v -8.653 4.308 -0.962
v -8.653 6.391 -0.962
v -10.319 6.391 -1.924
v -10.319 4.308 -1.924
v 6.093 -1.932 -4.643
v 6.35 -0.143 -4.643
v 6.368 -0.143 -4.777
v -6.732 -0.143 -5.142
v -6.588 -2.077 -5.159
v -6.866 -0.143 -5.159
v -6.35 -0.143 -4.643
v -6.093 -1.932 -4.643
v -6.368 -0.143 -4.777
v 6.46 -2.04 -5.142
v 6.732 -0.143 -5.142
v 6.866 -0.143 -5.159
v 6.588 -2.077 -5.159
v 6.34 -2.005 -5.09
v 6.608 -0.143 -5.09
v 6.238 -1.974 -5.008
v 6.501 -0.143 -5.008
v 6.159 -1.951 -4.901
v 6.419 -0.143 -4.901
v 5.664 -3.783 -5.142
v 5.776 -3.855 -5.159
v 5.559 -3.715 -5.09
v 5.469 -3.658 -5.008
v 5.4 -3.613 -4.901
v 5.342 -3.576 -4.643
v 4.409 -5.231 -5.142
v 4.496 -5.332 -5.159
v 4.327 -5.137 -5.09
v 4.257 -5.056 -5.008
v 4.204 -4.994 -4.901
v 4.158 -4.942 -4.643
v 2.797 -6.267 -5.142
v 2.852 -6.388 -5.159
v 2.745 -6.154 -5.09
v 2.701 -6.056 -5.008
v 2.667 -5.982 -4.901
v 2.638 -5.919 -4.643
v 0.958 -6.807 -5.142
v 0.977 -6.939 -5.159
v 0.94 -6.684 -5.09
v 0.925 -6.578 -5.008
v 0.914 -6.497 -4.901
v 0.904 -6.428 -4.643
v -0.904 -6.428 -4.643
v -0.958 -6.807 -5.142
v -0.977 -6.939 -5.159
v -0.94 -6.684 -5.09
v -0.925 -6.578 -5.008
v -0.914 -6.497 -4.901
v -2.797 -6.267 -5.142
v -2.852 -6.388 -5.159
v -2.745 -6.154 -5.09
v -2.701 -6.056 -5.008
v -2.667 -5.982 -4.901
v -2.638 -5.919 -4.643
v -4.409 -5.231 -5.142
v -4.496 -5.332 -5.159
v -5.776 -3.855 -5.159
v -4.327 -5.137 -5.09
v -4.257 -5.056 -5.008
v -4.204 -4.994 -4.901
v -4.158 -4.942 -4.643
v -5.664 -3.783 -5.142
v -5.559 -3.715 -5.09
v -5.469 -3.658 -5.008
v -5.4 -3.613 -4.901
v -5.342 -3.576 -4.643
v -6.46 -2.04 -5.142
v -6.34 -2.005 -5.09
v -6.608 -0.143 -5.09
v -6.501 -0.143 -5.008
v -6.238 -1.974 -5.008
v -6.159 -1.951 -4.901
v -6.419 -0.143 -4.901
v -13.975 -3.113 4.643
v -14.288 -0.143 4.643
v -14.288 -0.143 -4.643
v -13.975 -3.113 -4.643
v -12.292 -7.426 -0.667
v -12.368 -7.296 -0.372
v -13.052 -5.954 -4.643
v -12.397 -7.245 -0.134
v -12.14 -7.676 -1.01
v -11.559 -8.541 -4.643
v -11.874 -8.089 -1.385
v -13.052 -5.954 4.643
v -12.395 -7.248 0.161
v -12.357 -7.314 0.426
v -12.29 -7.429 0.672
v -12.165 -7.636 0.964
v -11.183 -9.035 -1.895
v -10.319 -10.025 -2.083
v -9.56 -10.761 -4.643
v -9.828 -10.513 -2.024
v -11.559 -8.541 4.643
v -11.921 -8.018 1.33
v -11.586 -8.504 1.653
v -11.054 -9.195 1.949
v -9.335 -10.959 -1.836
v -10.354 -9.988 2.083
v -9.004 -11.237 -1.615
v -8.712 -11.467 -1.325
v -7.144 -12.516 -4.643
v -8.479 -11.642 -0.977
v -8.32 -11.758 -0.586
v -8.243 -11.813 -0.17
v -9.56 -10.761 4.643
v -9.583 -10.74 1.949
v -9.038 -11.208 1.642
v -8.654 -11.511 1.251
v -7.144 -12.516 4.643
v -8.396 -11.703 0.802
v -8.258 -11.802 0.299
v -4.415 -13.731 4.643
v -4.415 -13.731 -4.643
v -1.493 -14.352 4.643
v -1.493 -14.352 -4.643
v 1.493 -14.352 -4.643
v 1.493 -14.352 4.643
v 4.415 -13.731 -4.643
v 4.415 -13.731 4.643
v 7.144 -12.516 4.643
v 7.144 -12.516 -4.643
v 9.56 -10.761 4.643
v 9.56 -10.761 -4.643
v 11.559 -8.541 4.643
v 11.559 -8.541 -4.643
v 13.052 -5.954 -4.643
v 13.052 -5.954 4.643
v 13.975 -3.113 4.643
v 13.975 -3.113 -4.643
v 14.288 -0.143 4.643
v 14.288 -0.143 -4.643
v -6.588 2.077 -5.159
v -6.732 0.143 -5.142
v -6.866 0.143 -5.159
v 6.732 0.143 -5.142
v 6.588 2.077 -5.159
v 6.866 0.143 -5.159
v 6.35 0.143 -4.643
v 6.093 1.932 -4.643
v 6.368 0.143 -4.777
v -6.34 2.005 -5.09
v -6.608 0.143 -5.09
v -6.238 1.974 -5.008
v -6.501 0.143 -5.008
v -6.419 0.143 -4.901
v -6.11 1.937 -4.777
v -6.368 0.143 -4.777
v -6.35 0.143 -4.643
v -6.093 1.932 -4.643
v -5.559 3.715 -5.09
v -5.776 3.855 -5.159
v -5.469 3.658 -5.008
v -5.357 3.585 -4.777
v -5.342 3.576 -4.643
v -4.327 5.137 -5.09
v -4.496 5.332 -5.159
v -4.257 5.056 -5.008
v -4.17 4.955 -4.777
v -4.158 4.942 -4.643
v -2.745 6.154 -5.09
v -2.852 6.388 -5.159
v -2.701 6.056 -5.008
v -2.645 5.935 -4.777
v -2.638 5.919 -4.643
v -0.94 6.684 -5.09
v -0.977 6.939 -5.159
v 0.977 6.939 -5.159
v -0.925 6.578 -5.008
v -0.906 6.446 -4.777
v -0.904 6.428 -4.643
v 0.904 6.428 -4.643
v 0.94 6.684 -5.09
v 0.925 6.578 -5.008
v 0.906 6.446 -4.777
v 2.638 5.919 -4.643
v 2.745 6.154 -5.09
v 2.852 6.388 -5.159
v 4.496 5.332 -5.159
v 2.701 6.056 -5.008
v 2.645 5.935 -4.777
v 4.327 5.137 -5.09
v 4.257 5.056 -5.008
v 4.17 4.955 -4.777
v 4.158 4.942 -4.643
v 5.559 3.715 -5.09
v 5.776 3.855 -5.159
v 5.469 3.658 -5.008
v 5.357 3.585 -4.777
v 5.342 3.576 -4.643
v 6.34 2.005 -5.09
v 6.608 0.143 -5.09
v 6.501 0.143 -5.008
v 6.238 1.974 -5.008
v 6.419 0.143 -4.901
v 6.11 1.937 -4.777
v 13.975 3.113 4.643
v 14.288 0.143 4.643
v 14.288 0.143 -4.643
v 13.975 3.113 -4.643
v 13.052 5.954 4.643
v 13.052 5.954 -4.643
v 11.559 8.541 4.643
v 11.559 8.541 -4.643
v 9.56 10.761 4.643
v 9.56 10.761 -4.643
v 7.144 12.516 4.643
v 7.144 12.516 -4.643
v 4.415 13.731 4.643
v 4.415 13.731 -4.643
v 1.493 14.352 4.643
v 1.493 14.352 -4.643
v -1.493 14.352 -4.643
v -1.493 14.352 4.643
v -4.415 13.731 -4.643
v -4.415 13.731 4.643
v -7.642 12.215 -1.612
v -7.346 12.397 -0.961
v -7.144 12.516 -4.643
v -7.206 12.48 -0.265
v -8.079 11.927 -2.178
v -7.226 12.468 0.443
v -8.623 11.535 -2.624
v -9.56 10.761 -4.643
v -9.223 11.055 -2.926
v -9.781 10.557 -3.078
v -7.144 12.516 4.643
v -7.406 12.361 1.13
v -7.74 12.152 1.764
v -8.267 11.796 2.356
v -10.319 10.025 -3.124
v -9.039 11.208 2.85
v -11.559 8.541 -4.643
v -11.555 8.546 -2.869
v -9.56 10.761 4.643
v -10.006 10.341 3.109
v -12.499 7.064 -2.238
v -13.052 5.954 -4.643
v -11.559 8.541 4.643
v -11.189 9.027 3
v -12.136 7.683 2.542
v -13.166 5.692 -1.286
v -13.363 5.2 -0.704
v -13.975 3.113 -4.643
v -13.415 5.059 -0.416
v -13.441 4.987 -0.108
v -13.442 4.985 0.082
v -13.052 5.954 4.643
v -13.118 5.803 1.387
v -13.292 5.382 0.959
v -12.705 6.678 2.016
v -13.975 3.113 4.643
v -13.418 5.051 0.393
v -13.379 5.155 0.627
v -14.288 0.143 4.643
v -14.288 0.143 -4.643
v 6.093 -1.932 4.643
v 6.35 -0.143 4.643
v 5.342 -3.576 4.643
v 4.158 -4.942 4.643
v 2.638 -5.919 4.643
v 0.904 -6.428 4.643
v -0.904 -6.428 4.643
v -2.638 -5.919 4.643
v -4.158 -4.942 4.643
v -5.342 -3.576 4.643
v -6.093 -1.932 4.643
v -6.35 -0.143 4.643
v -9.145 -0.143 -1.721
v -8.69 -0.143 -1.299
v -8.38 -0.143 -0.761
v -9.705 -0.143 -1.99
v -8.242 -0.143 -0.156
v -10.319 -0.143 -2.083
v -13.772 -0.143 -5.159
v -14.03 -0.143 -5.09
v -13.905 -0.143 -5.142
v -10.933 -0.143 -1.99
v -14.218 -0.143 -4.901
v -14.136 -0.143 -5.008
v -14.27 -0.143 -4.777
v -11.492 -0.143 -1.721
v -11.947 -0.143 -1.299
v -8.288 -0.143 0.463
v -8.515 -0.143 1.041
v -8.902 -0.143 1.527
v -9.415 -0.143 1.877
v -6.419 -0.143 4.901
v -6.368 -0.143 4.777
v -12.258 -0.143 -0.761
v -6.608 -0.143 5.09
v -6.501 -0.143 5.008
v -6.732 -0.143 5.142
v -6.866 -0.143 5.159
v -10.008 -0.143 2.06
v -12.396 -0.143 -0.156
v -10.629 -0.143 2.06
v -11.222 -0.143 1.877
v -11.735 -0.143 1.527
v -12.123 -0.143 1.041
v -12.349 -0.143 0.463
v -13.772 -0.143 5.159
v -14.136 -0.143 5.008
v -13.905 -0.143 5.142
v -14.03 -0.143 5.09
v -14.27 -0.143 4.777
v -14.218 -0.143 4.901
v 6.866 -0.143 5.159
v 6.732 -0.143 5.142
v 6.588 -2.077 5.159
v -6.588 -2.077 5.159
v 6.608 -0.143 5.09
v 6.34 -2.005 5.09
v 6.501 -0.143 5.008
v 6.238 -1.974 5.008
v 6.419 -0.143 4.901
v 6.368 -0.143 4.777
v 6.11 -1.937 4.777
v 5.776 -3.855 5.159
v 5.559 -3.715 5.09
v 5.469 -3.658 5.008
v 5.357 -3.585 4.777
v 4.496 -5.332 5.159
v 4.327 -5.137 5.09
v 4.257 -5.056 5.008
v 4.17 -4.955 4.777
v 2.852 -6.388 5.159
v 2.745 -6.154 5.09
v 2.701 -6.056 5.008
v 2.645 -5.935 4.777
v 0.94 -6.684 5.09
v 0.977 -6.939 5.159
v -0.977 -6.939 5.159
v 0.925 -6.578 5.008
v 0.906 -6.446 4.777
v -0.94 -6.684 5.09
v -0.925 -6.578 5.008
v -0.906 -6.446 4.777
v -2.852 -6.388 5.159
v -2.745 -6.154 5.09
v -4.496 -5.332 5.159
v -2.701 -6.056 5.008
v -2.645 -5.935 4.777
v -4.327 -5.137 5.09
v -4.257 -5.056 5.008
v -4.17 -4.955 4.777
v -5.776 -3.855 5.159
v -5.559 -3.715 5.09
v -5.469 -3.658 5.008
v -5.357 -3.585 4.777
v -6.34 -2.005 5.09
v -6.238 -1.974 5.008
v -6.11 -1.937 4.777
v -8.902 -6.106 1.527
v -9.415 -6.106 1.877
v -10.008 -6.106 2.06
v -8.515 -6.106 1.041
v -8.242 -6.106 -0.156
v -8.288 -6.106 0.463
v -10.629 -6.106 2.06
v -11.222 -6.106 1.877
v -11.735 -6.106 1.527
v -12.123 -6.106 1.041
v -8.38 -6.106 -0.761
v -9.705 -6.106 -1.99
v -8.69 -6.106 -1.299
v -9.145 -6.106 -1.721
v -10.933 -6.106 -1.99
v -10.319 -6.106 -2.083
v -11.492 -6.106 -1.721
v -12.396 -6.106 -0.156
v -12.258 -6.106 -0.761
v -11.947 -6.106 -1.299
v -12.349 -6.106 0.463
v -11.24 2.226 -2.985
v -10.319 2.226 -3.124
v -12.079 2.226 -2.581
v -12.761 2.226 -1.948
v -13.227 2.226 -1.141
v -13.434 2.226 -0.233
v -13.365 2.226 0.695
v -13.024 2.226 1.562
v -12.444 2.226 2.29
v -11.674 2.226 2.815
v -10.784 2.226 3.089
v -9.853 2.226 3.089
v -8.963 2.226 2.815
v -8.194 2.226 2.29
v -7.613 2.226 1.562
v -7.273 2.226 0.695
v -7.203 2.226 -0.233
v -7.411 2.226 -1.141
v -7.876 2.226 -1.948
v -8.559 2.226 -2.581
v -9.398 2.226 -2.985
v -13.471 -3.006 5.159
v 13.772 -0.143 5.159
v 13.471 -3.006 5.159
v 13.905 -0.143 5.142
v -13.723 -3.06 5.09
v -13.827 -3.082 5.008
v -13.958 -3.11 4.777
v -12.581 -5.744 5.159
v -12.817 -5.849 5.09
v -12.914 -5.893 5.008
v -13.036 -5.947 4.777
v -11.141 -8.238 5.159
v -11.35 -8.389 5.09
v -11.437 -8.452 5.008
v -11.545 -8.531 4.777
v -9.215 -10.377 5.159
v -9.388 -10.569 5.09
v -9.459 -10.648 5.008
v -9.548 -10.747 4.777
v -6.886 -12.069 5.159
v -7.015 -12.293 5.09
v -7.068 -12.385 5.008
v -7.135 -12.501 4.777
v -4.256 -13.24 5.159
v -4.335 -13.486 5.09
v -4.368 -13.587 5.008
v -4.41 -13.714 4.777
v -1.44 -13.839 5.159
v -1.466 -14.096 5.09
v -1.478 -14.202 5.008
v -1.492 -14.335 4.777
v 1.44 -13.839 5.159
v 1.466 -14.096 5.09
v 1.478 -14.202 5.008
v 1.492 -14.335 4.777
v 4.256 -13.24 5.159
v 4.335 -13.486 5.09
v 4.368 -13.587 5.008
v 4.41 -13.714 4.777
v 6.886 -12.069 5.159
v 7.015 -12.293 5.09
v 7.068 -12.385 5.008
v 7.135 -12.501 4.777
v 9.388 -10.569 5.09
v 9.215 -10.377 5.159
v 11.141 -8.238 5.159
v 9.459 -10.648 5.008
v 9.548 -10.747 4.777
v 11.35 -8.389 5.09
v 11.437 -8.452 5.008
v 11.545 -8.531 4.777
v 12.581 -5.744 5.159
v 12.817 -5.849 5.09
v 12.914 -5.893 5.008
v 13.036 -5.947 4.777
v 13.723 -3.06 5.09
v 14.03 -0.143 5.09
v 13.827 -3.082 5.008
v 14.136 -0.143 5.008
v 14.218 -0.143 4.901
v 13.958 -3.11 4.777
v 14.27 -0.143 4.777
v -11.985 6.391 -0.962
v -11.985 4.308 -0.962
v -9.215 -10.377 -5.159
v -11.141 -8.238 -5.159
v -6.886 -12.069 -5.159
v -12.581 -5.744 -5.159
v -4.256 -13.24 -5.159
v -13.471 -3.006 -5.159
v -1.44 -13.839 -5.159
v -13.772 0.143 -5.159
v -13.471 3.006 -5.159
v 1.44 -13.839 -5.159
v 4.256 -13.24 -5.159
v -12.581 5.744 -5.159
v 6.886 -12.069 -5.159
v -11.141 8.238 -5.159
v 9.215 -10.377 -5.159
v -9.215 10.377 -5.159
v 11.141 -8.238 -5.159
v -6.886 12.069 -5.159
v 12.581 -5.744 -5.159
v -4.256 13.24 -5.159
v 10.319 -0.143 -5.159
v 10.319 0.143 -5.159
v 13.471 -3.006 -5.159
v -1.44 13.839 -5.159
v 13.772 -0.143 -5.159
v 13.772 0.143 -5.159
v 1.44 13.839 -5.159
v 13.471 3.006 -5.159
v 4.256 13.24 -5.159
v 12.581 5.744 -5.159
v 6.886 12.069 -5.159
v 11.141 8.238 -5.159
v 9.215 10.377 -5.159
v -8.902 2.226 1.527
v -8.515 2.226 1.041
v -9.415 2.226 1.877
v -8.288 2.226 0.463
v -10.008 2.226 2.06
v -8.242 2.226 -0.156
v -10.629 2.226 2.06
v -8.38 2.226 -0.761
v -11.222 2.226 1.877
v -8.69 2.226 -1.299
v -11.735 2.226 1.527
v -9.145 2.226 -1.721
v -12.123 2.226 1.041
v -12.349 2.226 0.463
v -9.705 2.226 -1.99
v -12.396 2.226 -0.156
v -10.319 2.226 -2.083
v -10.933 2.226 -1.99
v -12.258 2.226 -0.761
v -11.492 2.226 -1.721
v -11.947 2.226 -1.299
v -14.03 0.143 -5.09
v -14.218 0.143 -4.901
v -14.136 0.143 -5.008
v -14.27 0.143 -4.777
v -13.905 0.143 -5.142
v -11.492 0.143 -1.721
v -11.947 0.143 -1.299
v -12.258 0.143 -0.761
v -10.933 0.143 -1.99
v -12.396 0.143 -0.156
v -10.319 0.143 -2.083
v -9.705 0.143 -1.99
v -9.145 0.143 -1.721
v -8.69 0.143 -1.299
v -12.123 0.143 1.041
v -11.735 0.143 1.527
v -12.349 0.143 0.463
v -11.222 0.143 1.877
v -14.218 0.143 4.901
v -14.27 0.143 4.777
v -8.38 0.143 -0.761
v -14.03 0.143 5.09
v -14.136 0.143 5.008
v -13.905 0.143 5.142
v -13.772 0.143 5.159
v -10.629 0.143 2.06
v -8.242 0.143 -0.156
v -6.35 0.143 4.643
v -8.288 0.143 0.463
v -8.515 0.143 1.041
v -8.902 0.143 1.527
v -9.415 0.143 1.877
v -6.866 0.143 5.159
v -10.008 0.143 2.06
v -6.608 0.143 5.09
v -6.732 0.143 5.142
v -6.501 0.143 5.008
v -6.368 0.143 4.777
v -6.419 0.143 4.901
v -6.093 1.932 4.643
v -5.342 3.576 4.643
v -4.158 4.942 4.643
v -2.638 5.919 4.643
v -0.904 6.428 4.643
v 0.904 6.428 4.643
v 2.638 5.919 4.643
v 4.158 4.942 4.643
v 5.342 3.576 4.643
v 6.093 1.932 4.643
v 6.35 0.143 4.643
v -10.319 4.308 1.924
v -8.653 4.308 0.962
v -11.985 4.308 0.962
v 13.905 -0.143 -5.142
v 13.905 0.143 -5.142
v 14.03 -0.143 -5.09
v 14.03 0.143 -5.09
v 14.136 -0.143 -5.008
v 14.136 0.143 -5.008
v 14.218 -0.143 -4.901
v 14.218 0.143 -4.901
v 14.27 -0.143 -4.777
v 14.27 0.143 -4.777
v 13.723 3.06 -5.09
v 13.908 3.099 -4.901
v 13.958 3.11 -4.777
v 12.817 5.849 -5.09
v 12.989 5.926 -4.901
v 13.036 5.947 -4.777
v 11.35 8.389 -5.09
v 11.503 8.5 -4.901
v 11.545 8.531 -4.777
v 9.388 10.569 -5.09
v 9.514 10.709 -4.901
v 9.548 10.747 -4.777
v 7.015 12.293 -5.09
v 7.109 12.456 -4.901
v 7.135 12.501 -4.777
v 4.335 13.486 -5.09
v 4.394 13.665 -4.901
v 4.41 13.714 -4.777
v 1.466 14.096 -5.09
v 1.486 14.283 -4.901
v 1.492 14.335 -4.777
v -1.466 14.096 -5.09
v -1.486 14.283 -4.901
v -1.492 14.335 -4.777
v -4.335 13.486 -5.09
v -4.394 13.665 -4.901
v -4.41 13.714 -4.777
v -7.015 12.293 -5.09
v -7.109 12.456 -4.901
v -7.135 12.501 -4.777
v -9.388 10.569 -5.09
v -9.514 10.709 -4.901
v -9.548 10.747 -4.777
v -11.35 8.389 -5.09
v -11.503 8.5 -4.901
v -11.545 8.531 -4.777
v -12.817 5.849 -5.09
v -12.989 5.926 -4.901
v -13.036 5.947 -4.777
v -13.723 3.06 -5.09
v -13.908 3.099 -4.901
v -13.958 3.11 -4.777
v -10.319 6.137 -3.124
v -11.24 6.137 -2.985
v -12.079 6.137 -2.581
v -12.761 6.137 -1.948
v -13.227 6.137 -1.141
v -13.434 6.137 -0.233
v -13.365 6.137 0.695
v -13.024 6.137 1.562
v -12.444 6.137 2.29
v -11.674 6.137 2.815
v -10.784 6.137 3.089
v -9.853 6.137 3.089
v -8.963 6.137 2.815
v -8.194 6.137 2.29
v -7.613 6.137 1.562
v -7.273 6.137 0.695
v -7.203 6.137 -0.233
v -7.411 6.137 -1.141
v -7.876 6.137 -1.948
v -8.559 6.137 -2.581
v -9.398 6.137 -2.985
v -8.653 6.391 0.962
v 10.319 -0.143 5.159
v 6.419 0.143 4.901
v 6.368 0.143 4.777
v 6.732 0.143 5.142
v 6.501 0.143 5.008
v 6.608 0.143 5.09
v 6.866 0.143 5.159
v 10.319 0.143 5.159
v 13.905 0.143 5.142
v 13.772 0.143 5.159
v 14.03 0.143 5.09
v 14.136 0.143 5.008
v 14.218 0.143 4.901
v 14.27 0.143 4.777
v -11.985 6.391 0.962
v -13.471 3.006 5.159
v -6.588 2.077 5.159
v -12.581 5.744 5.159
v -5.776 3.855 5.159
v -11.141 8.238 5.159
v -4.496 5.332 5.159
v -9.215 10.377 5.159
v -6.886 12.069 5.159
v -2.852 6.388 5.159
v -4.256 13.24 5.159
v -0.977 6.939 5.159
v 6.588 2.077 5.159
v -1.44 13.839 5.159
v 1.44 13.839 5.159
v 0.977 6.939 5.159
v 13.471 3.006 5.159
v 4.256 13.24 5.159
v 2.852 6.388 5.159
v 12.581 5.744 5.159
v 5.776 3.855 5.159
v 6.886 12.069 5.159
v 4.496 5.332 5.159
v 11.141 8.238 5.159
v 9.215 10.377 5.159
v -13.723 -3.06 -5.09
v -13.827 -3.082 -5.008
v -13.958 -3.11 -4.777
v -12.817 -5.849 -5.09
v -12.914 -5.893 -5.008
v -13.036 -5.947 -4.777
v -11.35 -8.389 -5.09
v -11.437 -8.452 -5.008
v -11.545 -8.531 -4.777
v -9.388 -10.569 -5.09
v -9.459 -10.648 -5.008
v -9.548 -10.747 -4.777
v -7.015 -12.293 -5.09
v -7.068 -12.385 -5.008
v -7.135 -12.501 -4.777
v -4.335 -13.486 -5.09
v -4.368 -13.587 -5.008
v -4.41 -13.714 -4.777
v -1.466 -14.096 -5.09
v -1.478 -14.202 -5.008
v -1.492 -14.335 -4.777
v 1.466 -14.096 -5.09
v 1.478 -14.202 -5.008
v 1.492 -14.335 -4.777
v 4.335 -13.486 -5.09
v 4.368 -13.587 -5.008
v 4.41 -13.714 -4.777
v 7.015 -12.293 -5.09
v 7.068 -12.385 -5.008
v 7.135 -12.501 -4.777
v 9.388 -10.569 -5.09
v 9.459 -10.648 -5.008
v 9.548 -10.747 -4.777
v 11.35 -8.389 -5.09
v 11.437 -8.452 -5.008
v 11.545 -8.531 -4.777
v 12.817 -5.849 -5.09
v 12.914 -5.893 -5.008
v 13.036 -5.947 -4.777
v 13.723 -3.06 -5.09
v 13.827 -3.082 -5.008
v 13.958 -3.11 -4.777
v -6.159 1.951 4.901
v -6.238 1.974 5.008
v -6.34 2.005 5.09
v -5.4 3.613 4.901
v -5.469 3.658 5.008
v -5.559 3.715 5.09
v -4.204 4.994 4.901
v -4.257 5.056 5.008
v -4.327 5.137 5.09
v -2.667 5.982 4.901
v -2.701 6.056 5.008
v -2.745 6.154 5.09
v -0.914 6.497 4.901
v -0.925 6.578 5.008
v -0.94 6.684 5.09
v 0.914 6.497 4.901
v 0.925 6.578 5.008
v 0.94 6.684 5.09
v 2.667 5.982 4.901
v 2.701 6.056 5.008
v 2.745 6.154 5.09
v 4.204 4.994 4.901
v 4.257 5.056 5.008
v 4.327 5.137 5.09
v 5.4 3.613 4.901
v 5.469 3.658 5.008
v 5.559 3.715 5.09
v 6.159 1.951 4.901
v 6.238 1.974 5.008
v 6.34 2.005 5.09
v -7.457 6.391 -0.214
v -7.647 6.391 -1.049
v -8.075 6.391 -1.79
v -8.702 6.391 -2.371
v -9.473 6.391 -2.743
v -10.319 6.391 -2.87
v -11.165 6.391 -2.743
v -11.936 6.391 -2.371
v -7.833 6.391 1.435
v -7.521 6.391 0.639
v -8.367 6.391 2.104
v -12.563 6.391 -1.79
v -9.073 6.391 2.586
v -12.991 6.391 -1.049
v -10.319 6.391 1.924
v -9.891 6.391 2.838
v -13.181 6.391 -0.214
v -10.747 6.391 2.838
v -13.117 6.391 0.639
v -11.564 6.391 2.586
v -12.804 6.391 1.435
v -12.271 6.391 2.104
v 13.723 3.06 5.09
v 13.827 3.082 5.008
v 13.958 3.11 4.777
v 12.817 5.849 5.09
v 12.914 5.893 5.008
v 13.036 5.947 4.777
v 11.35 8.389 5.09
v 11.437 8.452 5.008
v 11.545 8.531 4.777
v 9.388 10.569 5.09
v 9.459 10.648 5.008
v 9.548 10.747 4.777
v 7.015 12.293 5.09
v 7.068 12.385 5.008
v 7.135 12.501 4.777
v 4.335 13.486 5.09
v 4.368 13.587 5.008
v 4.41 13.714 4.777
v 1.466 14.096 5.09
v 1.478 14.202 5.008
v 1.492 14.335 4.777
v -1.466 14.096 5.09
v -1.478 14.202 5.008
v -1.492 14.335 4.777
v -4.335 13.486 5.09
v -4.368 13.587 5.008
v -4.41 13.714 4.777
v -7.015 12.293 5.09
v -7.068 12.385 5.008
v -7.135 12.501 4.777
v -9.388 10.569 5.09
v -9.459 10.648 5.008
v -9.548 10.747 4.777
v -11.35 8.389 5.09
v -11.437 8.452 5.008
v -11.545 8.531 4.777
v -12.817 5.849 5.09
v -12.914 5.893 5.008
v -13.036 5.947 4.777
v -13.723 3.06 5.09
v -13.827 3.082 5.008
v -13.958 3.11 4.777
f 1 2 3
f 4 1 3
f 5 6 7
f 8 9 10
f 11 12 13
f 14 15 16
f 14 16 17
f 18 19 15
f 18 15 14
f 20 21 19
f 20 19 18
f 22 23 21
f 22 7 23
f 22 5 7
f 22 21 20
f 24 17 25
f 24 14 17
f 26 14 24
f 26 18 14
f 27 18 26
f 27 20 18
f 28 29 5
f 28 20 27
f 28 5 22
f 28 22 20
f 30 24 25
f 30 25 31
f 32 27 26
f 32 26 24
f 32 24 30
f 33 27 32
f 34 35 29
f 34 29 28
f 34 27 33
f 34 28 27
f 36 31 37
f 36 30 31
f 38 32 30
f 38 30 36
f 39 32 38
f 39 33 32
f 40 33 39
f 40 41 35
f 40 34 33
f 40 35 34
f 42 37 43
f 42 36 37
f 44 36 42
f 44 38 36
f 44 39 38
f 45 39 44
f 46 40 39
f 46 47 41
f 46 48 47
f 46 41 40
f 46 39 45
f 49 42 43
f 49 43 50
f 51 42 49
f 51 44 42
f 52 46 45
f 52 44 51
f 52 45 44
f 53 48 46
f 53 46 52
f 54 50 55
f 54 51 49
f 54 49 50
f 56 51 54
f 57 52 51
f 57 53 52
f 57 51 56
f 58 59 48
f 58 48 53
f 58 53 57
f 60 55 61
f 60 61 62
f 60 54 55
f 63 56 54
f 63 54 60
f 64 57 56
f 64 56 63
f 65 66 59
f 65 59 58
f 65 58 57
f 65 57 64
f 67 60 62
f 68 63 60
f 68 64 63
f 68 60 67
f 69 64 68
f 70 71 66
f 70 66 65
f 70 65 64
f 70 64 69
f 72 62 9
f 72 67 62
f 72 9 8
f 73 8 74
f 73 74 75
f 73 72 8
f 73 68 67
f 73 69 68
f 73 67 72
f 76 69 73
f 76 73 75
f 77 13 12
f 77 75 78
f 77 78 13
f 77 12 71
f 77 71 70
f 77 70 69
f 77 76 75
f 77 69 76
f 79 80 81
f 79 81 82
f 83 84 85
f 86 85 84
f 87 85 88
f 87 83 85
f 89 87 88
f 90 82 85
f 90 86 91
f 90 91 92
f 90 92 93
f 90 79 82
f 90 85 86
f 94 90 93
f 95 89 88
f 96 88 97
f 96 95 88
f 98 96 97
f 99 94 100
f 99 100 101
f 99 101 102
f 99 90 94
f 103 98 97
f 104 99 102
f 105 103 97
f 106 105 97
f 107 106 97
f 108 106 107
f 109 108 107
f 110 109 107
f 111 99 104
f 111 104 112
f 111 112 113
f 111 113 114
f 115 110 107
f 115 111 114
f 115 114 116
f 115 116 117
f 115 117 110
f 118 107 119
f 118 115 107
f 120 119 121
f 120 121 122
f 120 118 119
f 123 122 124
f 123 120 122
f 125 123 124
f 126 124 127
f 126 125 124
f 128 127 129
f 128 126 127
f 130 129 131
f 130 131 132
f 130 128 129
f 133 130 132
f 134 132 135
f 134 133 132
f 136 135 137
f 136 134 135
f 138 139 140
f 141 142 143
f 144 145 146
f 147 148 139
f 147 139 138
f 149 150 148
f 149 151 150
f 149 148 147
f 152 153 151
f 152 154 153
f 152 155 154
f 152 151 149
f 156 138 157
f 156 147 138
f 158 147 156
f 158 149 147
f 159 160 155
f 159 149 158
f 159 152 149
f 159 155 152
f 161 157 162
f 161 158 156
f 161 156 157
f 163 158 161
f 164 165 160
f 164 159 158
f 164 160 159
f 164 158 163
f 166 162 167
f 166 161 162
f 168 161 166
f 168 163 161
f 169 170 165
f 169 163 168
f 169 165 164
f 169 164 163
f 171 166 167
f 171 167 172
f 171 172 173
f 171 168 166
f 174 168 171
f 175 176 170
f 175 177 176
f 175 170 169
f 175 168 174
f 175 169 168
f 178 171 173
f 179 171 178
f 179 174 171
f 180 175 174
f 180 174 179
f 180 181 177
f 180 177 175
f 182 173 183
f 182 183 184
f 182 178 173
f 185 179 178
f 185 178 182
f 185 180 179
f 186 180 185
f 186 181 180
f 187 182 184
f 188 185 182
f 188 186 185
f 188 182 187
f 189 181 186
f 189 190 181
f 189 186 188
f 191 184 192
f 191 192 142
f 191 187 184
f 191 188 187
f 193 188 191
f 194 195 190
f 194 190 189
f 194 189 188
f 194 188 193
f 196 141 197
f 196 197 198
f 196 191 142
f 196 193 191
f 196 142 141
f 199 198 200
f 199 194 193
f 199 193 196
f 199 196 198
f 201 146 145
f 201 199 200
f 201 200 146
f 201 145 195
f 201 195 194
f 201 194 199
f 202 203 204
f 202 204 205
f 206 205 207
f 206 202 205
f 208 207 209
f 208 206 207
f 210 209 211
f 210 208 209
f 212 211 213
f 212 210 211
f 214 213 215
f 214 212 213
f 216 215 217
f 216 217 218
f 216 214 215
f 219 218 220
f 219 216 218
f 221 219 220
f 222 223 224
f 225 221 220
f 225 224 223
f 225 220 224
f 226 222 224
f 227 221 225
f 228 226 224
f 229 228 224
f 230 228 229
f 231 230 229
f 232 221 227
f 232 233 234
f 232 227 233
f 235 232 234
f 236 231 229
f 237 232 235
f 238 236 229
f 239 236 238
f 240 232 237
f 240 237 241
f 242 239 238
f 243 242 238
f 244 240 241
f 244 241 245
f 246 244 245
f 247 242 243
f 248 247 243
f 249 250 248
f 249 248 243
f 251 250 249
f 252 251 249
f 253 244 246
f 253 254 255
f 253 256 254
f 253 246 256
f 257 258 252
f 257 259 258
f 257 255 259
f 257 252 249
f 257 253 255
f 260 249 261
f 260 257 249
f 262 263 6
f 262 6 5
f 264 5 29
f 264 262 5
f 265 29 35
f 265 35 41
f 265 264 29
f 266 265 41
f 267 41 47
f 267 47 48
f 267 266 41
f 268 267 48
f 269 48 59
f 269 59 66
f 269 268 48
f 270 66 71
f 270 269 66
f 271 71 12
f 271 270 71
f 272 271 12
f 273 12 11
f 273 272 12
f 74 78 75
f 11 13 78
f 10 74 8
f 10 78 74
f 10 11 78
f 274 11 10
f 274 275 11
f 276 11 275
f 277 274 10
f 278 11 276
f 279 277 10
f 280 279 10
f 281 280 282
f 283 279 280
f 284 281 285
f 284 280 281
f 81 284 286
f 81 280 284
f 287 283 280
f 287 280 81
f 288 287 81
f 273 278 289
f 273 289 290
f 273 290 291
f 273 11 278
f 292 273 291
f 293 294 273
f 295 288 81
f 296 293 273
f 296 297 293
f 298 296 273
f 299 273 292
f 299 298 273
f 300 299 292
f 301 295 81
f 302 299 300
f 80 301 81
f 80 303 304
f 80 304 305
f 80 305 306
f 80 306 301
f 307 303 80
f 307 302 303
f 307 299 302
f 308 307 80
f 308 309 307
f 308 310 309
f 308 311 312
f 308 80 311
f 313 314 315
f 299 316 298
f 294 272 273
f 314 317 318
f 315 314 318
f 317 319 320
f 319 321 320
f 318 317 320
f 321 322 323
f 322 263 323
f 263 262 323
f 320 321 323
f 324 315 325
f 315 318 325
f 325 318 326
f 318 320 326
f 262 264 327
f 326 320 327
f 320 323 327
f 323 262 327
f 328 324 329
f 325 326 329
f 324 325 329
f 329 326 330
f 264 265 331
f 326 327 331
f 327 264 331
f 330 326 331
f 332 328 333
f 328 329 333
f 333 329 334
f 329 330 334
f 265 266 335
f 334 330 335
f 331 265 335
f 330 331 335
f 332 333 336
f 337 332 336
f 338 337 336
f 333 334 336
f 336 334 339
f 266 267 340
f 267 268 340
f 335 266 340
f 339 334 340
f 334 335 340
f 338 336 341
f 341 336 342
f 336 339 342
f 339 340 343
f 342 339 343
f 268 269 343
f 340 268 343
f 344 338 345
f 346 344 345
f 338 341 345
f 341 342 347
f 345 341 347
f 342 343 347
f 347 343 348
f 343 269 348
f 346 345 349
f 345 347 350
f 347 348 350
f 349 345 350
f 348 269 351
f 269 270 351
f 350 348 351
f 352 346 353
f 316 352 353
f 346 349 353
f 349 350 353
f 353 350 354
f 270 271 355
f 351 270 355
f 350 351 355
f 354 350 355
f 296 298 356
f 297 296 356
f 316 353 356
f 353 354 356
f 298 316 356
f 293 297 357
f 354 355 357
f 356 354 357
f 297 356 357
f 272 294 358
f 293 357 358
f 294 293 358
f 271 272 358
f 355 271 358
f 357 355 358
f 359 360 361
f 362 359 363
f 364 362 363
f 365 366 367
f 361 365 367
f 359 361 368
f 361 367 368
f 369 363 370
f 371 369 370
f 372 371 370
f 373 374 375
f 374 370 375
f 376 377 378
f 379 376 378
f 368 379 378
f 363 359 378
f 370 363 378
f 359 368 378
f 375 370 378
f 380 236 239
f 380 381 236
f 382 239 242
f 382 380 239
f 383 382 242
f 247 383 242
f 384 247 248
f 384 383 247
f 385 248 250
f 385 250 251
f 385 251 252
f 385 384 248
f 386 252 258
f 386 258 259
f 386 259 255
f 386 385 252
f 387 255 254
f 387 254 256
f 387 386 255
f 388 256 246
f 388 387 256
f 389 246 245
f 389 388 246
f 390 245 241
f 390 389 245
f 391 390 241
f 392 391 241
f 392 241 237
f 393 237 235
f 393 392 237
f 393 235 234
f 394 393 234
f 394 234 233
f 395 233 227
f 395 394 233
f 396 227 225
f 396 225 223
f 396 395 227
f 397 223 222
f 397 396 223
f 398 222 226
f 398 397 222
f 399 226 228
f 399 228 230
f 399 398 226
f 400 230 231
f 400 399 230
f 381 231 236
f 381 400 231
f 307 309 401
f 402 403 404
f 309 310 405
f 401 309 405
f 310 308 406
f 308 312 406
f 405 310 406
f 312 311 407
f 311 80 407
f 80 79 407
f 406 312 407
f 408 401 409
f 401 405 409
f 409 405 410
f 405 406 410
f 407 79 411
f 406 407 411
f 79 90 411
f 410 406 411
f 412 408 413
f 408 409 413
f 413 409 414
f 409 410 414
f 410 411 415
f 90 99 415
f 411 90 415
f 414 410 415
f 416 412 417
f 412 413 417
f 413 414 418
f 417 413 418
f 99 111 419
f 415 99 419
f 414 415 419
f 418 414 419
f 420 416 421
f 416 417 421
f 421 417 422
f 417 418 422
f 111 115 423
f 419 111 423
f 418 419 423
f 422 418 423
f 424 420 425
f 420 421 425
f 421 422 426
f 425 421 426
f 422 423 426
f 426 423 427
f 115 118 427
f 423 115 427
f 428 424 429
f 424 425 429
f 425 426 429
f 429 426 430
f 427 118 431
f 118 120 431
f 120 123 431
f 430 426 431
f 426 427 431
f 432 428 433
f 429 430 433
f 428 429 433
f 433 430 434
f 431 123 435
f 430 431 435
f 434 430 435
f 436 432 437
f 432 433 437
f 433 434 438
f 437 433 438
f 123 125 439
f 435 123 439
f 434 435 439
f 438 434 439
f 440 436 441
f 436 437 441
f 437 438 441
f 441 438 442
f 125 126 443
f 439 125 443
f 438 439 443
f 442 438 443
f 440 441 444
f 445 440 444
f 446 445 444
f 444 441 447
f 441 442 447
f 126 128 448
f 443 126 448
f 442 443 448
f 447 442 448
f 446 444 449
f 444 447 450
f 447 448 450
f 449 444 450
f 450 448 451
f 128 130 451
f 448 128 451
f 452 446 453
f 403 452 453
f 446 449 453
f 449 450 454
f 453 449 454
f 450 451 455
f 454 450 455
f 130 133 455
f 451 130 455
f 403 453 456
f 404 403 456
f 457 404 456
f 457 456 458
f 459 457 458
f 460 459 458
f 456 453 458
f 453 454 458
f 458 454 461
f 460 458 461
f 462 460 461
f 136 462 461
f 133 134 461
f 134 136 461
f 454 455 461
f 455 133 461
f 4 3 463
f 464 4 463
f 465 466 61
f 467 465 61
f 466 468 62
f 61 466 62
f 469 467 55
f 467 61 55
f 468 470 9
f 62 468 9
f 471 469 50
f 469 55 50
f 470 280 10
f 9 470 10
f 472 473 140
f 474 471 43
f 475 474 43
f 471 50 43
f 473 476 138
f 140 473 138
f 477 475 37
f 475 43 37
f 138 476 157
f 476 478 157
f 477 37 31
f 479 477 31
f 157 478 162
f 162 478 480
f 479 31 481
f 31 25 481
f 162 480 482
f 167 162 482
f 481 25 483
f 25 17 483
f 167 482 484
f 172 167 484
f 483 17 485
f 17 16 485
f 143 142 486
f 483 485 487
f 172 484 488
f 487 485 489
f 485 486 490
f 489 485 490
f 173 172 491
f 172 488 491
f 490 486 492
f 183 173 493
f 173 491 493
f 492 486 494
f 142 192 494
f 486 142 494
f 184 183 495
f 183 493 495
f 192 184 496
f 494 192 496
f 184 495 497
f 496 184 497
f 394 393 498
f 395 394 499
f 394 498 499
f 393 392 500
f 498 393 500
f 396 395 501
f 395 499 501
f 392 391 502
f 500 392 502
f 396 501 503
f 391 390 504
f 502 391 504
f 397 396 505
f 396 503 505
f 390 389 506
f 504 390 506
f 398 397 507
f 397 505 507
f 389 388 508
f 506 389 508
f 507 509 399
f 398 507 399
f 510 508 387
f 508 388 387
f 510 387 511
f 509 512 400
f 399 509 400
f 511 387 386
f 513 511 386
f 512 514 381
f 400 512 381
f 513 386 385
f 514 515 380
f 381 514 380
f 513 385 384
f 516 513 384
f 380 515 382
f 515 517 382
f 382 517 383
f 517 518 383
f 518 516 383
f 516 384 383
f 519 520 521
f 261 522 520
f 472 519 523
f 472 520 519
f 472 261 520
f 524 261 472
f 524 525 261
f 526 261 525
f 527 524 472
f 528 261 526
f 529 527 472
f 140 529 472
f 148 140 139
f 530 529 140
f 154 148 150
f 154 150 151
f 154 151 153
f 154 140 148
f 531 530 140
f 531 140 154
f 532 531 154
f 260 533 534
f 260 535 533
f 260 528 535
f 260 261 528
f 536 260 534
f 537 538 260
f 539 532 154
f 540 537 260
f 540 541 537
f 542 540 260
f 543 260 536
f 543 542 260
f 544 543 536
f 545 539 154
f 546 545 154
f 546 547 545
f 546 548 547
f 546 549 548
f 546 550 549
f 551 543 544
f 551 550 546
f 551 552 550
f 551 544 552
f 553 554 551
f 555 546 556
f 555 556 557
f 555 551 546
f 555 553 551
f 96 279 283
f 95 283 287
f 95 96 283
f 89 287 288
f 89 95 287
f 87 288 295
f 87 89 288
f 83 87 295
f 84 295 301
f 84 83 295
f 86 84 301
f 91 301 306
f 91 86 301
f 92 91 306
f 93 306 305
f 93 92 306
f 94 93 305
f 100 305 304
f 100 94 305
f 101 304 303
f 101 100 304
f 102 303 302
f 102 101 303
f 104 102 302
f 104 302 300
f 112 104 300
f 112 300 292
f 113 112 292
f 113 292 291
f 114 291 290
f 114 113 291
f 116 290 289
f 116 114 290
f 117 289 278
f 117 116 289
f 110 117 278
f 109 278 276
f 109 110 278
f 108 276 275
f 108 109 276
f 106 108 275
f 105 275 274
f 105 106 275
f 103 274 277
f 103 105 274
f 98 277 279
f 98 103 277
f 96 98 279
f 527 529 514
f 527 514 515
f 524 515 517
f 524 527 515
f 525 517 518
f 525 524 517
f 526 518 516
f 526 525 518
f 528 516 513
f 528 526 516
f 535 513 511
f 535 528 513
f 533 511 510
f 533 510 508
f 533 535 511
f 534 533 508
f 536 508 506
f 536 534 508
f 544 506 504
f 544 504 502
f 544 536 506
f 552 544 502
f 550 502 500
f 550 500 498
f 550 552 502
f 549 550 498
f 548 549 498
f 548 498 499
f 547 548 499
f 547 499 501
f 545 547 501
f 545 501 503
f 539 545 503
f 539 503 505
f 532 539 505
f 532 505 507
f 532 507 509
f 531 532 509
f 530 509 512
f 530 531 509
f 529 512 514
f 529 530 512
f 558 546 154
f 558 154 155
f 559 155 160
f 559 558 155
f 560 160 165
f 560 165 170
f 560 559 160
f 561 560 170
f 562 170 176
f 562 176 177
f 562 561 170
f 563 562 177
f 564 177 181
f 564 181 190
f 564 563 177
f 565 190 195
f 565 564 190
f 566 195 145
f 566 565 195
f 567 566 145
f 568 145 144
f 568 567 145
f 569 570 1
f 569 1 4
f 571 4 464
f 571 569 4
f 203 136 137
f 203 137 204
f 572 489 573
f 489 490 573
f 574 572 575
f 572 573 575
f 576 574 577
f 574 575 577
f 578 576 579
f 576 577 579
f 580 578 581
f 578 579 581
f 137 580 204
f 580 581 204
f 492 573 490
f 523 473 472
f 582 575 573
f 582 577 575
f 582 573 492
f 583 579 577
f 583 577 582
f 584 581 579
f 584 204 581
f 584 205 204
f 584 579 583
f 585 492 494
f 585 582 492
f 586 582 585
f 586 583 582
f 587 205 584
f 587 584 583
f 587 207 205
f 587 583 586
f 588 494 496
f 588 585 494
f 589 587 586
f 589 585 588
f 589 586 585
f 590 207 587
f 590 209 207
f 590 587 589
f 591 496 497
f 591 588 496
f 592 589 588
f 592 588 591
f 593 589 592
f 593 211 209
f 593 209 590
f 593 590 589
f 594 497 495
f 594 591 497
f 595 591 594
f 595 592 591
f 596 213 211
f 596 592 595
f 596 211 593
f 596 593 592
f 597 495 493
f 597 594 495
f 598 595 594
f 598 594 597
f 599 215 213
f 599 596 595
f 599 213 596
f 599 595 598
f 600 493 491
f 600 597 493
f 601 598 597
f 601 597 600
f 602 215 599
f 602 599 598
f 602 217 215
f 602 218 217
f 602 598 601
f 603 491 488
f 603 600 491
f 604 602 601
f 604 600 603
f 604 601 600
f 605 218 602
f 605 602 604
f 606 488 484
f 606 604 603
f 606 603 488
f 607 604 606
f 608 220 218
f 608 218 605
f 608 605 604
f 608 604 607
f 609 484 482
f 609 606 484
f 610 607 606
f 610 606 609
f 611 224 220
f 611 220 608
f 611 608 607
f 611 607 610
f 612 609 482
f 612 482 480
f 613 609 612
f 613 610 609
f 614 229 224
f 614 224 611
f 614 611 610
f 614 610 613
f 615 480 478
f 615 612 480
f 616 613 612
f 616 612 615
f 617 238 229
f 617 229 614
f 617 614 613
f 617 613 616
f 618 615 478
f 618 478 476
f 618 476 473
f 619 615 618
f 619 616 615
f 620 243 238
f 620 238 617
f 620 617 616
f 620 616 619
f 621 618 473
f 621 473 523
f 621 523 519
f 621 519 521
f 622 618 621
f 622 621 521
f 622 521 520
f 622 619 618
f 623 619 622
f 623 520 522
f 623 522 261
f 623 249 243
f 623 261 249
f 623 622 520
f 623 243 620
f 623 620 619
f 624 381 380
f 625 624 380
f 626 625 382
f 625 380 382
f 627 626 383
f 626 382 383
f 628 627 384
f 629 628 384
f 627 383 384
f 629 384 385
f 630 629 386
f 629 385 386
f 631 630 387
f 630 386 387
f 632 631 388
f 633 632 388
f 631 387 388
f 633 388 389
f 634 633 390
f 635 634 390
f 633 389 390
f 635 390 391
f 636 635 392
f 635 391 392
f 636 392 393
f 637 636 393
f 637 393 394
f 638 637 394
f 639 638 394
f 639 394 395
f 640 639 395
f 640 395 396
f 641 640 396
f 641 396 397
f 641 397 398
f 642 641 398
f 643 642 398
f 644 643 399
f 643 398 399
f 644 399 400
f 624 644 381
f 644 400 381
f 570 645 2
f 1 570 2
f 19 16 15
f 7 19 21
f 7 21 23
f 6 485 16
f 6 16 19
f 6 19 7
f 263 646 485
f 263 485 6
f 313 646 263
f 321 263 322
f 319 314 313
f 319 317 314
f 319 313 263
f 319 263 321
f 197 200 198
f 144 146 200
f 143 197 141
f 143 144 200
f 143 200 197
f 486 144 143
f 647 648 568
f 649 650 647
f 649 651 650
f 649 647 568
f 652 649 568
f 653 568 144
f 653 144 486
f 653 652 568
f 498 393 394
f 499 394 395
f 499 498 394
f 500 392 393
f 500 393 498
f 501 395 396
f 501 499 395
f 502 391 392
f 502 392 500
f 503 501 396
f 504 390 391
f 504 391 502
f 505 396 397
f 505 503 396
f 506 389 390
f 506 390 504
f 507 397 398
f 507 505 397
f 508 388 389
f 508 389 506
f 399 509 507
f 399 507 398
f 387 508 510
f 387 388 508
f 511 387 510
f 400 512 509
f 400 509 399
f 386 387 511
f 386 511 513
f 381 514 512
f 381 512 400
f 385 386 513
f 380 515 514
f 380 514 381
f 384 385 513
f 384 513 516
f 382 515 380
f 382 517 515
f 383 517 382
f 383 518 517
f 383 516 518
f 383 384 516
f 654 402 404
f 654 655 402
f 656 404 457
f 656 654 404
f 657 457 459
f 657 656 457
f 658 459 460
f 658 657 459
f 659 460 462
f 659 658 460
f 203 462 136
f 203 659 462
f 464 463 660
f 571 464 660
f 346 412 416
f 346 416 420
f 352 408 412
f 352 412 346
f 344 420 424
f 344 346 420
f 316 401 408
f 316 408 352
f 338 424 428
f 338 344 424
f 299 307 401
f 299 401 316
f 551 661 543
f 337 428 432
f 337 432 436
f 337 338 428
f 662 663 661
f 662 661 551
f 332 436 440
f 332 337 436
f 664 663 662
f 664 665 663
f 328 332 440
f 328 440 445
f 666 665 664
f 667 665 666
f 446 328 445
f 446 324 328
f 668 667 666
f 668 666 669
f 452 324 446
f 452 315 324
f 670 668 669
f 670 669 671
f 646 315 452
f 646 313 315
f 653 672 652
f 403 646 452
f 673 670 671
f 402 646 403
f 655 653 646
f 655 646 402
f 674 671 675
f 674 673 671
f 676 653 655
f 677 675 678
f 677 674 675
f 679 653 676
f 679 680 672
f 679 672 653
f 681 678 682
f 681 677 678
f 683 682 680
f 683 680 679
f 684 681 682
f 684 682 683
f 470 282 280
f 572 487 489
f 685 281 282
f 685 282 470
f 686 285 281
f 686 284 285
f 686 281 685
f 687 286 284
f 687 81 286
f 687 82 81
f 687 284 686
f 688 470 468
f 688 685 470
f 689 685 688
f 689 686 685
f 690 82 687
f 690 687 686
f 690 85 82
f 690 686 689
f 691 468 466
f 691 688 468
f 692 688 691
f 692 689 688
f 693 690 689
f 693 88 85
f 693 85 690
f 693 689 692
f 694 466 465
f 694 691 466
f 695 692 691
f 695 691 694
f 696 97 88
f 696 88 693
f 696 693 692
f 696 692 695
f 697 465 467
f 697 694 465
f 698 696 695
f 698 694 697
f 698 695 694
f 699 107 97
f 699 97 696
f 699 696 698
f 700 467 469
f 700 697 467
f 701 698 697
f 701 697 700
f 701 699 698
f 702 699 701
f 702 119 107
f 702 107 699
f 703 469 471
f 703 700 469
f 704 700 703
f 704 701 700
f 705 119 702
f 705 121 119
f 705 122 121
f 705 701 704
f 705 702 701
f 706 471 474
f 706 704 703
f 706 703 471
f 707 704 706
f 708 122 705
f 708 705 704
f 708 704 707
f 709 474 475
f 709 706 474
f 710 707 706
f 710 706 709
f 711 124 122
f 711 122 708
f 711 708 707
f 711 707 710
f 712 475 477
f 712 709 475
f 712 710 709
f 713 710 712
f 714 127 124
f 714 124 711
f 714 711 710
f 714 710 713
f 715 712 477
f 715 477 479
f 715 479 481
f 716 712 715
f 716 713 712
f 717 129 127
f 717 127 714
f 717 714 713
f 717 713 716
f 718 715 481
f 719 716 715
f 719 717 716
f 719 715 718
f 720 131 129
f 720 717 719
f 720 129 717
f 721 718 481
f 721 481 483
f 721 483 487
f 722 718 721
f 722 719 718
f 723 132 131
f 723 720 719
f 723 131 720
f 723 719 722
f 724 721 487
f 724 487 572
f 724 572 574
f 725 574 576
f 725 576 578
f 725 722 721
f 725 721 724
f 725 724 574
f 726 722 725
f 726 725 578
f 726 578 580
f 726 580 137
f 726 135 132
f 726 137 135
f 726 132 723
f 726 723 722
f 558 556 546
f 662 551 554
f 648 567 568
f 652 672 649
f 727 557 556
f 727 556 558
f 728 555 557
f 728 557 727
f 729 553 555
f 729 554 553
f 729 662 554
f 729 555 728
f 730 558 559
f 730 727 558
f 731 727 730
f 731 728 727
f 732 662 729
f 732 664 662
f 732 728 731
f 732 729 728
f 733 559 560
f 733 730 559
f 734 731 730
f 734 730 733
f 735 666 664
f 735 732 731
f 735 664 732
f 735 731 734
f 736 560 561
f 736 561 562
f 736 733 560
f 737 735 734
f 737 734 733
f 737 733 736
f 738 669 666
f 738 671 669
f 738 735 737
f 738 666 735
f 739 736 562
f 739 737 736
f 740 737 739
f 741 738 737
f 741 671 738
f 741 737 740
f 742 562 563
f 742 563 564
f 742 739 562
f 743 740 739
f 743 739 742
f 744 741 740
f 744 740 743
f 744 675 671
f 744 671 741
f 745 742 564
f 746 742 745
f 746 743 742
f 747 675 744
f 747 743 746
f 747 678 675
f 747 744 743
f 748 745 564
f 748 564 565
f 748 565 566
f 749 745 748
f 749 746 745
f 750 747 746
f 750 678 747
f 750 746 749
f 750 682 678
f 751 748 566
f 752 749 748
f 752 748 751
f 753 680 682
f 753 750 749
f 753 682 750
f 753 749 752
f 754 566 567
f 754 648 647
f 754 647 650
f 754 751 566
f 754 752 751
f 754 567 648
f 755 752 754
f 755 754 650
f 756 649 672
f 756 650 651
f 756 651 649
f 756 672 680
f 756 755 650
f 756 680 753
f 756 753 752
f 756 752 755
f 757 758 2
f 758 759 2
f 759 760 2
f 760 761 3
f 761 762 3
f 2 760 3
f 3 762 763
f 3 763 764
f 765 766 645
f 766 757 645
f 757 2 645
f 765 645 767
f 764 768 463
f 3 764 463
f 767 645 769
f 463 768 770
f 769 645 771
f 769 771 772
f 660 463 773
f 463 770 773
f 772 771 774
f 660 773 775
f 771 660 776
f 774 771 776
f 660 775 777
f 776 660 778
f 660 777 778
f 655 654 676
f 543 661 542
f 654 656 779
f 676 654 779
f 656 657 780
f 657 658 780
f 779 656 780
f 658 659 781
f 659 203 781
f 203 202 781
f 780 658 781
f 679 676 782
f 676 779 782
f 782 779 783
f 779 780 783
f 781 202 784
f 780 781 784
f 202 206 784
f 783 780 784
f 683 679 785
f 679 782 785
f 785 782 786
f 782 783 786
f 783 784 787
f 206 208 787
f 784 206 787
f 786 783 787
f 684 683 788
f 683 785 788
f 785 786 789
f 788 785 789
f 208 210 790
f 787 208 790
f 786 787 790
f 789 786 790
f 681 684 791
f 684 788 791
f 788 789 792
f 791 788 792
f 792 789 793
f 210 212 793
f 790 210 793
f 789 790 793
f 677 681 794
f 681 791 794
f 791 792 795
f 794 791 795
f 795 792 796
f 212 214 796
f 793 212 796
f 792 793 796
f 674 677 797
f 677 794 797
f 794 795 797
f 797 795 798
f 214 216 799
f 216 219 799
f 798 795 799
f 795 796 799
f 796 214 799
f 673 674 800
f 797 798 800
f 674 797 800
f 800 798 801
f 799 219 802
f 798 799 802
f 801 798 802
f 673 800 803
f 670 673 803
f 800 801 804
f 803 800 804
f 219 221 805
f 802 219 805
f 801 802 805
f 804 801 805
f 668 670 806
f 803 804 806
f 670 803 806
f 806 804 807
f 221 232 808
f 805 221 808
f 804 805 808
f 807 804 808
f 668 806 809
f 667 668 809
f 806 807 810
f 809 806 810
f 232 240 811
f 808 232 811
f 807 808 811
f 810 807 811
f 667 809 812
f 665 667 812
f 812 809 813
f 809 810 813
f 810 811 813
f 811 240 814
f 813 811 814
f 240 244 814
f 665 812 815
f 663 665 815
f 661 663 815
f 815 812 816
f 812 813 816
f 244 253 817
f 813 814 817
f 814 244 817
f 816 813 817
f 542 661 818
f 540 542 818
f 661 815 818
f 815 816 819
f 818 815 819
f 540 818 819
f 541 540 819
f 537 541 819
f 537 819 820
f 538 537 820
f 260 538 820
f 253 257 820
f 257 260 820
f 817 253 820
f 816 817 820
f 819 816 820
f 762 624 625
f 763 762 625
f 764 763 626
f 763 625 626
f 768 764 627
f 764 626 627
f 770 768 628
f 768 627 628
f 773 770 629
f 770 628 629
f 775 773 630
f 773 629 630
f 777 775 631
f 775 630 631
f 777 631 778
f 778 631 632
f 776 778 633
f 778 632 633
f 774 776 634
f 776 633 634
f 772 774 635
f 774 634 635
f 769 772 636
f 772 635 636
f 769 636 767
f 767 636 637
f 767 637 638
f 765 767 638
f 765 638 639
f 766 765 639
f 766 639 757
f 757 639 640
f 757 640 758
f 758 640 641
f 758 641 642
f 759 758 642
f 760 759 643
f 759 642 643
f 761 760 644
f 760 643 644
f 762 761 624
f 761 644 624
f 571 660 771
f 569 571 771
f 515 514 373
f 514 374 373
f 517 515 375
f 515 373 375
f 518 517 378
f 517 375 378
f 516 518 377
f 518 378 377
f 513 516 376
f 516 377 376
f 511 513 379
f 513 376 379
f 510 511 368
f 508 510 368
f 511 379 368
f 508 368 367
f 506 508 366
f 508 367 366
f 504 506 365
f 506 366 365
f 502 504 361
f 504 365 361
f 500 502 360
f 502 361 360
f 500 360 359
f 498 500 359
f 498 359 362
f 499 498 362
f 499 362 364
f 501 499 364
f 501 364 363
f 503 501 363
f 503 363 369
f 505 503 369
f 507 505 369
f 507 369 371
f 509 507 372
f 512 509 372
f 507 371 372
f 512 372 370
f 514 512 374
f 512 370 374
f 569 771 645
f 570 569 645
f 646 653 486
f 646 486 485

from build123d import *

# Parameters (mm, degrees)
EXTRUDE1_DEPTH     = 5.159375
CUT_EXTRUDE2_DEPTH = 2.0828
FILLET1_R          = 0.5159375
FILLET2_R          = 0.5159375
CHAMFER2_SIZE      = 0.254


with BuildPart() as part:
    # Sketch1 → Extrude1 (new, symmetric)
    with BuildSketch(Plane.XY):
        with BuildLine():
            Line((-14.2875, 0.142875), (-6.35, 0.142875))
            ThreePointArc((-6.35, 0.142875), (0, 6.492875), (6.35, 0.142875))
            Line((6.35, 0.142875), (10.31875, 0.142875))
            Line((10.31875, 0.142875), (10.31875, -0.142875))
            Line((10.31875, -0.142875), (6.35, -0.142875))
            ThreePointArc((6.35, -0.142875), (0, -6.492875), (-6.35, -0.142875))
            Line((-6.35, -0.142875), (-14.2875, -0.142875))
            ThreePointArc((-14.2875, -0.142875), (0, -14.430375), (14.2875, -0.142875))
            Line((14.2875, -0.142875), (14.2875, 0.142875))
            ThreePointArc((14.2875, 0.142875), (0, 14.430375), (-14.2875, 0.142875))
        make_face()
    extrude(amount=EXTRUDE1_DEPTH, both=True)

    # Sketch4 → Cut-Revolve1 (revolve, cut)
    with BuildSketch(Plane.XY):
        Polygon((-10.31875, 14.430375), (-7.19455, 14.430375), (-7.19455, 2.225675), (-8.23595, 2.225675), (-8.23595, -14.430375), (-10.31875, -14.430375), align=None)
    revolve(axis=Axis((-10.31875, -14.430375, 0), (0, 1, 0)), mode=Mode.SUBTRACT)

    # Fillet1
    fillet1_edges = [part.edges().sort_by_distance(p)[0] for p in [
        (0, 6.492875, -5.159375),
        (0, 6.492875, 5.159375),
        (0, 14.430375, -5.159375),
        (0, 14.430375, 5.159375),
        (0, -14.430375, -5.159375),
        (0, -14.430375, 5.159375),
        (14.2875, 0, -5.159375),
        (14.2875, 0, 5.159375),
    ]]
    fillet(fillet1_edges, radius=FILLET1_R)

    # Fillet2
    fillet2_edges = [part.edges().sort_by_distance(p)[0] for p in [
        (0, -6.492875, -5.159375),
        (0, -6.492875, 5.159375),
    ]]
    fillet(fillet2_edges, radius=FILLET2_R)


with BuildPart() as body_2:
    # Sketch6 → Revolve1 (revolve)
    with BuildSketch(Plane.XY):
        Polygon((-10.31875, 6.391275), (-7.19455, 6.391275), (-7.19455, 2.225675), (-8.23595, 2.225675), (-8.23595, -6.105525), (-10.31875, -6.105525), align=None)
    revolve(axis=Axis((-10.31875, -6.105525, 0), (0, 1, 0)))

    # Sketch7 → Cut-Extrude2 (cut)
    with BuildSketch(Plane(origin=(0, 6.391275, 0), x_dir=(-1, 0, 0), z_dir=(0, 1, 0))):
        Polygon((10.31875, -1.924008225), (11.98499, -0.962004113), (11.98499, 0.962004113), (10.31875, 1.924008225), (8.65251, 0.962004113), (8.65251, -0.962004113), align=None)
    extrude(amount=-CUT_EXTRUDE2_DEPTH, mode=Mode.SUBTRACT)

    # Chamfer2
    chamfer2_edges = [body_2.edges().sort_by_distance(p)[0] for p in [
        (-13.44295, 6.391275, 0),
    ]]
    chamfer(chamfer2_edges, length=CHAMFER2_SIZE)


solid = Compound([part.part, body_2.part])
